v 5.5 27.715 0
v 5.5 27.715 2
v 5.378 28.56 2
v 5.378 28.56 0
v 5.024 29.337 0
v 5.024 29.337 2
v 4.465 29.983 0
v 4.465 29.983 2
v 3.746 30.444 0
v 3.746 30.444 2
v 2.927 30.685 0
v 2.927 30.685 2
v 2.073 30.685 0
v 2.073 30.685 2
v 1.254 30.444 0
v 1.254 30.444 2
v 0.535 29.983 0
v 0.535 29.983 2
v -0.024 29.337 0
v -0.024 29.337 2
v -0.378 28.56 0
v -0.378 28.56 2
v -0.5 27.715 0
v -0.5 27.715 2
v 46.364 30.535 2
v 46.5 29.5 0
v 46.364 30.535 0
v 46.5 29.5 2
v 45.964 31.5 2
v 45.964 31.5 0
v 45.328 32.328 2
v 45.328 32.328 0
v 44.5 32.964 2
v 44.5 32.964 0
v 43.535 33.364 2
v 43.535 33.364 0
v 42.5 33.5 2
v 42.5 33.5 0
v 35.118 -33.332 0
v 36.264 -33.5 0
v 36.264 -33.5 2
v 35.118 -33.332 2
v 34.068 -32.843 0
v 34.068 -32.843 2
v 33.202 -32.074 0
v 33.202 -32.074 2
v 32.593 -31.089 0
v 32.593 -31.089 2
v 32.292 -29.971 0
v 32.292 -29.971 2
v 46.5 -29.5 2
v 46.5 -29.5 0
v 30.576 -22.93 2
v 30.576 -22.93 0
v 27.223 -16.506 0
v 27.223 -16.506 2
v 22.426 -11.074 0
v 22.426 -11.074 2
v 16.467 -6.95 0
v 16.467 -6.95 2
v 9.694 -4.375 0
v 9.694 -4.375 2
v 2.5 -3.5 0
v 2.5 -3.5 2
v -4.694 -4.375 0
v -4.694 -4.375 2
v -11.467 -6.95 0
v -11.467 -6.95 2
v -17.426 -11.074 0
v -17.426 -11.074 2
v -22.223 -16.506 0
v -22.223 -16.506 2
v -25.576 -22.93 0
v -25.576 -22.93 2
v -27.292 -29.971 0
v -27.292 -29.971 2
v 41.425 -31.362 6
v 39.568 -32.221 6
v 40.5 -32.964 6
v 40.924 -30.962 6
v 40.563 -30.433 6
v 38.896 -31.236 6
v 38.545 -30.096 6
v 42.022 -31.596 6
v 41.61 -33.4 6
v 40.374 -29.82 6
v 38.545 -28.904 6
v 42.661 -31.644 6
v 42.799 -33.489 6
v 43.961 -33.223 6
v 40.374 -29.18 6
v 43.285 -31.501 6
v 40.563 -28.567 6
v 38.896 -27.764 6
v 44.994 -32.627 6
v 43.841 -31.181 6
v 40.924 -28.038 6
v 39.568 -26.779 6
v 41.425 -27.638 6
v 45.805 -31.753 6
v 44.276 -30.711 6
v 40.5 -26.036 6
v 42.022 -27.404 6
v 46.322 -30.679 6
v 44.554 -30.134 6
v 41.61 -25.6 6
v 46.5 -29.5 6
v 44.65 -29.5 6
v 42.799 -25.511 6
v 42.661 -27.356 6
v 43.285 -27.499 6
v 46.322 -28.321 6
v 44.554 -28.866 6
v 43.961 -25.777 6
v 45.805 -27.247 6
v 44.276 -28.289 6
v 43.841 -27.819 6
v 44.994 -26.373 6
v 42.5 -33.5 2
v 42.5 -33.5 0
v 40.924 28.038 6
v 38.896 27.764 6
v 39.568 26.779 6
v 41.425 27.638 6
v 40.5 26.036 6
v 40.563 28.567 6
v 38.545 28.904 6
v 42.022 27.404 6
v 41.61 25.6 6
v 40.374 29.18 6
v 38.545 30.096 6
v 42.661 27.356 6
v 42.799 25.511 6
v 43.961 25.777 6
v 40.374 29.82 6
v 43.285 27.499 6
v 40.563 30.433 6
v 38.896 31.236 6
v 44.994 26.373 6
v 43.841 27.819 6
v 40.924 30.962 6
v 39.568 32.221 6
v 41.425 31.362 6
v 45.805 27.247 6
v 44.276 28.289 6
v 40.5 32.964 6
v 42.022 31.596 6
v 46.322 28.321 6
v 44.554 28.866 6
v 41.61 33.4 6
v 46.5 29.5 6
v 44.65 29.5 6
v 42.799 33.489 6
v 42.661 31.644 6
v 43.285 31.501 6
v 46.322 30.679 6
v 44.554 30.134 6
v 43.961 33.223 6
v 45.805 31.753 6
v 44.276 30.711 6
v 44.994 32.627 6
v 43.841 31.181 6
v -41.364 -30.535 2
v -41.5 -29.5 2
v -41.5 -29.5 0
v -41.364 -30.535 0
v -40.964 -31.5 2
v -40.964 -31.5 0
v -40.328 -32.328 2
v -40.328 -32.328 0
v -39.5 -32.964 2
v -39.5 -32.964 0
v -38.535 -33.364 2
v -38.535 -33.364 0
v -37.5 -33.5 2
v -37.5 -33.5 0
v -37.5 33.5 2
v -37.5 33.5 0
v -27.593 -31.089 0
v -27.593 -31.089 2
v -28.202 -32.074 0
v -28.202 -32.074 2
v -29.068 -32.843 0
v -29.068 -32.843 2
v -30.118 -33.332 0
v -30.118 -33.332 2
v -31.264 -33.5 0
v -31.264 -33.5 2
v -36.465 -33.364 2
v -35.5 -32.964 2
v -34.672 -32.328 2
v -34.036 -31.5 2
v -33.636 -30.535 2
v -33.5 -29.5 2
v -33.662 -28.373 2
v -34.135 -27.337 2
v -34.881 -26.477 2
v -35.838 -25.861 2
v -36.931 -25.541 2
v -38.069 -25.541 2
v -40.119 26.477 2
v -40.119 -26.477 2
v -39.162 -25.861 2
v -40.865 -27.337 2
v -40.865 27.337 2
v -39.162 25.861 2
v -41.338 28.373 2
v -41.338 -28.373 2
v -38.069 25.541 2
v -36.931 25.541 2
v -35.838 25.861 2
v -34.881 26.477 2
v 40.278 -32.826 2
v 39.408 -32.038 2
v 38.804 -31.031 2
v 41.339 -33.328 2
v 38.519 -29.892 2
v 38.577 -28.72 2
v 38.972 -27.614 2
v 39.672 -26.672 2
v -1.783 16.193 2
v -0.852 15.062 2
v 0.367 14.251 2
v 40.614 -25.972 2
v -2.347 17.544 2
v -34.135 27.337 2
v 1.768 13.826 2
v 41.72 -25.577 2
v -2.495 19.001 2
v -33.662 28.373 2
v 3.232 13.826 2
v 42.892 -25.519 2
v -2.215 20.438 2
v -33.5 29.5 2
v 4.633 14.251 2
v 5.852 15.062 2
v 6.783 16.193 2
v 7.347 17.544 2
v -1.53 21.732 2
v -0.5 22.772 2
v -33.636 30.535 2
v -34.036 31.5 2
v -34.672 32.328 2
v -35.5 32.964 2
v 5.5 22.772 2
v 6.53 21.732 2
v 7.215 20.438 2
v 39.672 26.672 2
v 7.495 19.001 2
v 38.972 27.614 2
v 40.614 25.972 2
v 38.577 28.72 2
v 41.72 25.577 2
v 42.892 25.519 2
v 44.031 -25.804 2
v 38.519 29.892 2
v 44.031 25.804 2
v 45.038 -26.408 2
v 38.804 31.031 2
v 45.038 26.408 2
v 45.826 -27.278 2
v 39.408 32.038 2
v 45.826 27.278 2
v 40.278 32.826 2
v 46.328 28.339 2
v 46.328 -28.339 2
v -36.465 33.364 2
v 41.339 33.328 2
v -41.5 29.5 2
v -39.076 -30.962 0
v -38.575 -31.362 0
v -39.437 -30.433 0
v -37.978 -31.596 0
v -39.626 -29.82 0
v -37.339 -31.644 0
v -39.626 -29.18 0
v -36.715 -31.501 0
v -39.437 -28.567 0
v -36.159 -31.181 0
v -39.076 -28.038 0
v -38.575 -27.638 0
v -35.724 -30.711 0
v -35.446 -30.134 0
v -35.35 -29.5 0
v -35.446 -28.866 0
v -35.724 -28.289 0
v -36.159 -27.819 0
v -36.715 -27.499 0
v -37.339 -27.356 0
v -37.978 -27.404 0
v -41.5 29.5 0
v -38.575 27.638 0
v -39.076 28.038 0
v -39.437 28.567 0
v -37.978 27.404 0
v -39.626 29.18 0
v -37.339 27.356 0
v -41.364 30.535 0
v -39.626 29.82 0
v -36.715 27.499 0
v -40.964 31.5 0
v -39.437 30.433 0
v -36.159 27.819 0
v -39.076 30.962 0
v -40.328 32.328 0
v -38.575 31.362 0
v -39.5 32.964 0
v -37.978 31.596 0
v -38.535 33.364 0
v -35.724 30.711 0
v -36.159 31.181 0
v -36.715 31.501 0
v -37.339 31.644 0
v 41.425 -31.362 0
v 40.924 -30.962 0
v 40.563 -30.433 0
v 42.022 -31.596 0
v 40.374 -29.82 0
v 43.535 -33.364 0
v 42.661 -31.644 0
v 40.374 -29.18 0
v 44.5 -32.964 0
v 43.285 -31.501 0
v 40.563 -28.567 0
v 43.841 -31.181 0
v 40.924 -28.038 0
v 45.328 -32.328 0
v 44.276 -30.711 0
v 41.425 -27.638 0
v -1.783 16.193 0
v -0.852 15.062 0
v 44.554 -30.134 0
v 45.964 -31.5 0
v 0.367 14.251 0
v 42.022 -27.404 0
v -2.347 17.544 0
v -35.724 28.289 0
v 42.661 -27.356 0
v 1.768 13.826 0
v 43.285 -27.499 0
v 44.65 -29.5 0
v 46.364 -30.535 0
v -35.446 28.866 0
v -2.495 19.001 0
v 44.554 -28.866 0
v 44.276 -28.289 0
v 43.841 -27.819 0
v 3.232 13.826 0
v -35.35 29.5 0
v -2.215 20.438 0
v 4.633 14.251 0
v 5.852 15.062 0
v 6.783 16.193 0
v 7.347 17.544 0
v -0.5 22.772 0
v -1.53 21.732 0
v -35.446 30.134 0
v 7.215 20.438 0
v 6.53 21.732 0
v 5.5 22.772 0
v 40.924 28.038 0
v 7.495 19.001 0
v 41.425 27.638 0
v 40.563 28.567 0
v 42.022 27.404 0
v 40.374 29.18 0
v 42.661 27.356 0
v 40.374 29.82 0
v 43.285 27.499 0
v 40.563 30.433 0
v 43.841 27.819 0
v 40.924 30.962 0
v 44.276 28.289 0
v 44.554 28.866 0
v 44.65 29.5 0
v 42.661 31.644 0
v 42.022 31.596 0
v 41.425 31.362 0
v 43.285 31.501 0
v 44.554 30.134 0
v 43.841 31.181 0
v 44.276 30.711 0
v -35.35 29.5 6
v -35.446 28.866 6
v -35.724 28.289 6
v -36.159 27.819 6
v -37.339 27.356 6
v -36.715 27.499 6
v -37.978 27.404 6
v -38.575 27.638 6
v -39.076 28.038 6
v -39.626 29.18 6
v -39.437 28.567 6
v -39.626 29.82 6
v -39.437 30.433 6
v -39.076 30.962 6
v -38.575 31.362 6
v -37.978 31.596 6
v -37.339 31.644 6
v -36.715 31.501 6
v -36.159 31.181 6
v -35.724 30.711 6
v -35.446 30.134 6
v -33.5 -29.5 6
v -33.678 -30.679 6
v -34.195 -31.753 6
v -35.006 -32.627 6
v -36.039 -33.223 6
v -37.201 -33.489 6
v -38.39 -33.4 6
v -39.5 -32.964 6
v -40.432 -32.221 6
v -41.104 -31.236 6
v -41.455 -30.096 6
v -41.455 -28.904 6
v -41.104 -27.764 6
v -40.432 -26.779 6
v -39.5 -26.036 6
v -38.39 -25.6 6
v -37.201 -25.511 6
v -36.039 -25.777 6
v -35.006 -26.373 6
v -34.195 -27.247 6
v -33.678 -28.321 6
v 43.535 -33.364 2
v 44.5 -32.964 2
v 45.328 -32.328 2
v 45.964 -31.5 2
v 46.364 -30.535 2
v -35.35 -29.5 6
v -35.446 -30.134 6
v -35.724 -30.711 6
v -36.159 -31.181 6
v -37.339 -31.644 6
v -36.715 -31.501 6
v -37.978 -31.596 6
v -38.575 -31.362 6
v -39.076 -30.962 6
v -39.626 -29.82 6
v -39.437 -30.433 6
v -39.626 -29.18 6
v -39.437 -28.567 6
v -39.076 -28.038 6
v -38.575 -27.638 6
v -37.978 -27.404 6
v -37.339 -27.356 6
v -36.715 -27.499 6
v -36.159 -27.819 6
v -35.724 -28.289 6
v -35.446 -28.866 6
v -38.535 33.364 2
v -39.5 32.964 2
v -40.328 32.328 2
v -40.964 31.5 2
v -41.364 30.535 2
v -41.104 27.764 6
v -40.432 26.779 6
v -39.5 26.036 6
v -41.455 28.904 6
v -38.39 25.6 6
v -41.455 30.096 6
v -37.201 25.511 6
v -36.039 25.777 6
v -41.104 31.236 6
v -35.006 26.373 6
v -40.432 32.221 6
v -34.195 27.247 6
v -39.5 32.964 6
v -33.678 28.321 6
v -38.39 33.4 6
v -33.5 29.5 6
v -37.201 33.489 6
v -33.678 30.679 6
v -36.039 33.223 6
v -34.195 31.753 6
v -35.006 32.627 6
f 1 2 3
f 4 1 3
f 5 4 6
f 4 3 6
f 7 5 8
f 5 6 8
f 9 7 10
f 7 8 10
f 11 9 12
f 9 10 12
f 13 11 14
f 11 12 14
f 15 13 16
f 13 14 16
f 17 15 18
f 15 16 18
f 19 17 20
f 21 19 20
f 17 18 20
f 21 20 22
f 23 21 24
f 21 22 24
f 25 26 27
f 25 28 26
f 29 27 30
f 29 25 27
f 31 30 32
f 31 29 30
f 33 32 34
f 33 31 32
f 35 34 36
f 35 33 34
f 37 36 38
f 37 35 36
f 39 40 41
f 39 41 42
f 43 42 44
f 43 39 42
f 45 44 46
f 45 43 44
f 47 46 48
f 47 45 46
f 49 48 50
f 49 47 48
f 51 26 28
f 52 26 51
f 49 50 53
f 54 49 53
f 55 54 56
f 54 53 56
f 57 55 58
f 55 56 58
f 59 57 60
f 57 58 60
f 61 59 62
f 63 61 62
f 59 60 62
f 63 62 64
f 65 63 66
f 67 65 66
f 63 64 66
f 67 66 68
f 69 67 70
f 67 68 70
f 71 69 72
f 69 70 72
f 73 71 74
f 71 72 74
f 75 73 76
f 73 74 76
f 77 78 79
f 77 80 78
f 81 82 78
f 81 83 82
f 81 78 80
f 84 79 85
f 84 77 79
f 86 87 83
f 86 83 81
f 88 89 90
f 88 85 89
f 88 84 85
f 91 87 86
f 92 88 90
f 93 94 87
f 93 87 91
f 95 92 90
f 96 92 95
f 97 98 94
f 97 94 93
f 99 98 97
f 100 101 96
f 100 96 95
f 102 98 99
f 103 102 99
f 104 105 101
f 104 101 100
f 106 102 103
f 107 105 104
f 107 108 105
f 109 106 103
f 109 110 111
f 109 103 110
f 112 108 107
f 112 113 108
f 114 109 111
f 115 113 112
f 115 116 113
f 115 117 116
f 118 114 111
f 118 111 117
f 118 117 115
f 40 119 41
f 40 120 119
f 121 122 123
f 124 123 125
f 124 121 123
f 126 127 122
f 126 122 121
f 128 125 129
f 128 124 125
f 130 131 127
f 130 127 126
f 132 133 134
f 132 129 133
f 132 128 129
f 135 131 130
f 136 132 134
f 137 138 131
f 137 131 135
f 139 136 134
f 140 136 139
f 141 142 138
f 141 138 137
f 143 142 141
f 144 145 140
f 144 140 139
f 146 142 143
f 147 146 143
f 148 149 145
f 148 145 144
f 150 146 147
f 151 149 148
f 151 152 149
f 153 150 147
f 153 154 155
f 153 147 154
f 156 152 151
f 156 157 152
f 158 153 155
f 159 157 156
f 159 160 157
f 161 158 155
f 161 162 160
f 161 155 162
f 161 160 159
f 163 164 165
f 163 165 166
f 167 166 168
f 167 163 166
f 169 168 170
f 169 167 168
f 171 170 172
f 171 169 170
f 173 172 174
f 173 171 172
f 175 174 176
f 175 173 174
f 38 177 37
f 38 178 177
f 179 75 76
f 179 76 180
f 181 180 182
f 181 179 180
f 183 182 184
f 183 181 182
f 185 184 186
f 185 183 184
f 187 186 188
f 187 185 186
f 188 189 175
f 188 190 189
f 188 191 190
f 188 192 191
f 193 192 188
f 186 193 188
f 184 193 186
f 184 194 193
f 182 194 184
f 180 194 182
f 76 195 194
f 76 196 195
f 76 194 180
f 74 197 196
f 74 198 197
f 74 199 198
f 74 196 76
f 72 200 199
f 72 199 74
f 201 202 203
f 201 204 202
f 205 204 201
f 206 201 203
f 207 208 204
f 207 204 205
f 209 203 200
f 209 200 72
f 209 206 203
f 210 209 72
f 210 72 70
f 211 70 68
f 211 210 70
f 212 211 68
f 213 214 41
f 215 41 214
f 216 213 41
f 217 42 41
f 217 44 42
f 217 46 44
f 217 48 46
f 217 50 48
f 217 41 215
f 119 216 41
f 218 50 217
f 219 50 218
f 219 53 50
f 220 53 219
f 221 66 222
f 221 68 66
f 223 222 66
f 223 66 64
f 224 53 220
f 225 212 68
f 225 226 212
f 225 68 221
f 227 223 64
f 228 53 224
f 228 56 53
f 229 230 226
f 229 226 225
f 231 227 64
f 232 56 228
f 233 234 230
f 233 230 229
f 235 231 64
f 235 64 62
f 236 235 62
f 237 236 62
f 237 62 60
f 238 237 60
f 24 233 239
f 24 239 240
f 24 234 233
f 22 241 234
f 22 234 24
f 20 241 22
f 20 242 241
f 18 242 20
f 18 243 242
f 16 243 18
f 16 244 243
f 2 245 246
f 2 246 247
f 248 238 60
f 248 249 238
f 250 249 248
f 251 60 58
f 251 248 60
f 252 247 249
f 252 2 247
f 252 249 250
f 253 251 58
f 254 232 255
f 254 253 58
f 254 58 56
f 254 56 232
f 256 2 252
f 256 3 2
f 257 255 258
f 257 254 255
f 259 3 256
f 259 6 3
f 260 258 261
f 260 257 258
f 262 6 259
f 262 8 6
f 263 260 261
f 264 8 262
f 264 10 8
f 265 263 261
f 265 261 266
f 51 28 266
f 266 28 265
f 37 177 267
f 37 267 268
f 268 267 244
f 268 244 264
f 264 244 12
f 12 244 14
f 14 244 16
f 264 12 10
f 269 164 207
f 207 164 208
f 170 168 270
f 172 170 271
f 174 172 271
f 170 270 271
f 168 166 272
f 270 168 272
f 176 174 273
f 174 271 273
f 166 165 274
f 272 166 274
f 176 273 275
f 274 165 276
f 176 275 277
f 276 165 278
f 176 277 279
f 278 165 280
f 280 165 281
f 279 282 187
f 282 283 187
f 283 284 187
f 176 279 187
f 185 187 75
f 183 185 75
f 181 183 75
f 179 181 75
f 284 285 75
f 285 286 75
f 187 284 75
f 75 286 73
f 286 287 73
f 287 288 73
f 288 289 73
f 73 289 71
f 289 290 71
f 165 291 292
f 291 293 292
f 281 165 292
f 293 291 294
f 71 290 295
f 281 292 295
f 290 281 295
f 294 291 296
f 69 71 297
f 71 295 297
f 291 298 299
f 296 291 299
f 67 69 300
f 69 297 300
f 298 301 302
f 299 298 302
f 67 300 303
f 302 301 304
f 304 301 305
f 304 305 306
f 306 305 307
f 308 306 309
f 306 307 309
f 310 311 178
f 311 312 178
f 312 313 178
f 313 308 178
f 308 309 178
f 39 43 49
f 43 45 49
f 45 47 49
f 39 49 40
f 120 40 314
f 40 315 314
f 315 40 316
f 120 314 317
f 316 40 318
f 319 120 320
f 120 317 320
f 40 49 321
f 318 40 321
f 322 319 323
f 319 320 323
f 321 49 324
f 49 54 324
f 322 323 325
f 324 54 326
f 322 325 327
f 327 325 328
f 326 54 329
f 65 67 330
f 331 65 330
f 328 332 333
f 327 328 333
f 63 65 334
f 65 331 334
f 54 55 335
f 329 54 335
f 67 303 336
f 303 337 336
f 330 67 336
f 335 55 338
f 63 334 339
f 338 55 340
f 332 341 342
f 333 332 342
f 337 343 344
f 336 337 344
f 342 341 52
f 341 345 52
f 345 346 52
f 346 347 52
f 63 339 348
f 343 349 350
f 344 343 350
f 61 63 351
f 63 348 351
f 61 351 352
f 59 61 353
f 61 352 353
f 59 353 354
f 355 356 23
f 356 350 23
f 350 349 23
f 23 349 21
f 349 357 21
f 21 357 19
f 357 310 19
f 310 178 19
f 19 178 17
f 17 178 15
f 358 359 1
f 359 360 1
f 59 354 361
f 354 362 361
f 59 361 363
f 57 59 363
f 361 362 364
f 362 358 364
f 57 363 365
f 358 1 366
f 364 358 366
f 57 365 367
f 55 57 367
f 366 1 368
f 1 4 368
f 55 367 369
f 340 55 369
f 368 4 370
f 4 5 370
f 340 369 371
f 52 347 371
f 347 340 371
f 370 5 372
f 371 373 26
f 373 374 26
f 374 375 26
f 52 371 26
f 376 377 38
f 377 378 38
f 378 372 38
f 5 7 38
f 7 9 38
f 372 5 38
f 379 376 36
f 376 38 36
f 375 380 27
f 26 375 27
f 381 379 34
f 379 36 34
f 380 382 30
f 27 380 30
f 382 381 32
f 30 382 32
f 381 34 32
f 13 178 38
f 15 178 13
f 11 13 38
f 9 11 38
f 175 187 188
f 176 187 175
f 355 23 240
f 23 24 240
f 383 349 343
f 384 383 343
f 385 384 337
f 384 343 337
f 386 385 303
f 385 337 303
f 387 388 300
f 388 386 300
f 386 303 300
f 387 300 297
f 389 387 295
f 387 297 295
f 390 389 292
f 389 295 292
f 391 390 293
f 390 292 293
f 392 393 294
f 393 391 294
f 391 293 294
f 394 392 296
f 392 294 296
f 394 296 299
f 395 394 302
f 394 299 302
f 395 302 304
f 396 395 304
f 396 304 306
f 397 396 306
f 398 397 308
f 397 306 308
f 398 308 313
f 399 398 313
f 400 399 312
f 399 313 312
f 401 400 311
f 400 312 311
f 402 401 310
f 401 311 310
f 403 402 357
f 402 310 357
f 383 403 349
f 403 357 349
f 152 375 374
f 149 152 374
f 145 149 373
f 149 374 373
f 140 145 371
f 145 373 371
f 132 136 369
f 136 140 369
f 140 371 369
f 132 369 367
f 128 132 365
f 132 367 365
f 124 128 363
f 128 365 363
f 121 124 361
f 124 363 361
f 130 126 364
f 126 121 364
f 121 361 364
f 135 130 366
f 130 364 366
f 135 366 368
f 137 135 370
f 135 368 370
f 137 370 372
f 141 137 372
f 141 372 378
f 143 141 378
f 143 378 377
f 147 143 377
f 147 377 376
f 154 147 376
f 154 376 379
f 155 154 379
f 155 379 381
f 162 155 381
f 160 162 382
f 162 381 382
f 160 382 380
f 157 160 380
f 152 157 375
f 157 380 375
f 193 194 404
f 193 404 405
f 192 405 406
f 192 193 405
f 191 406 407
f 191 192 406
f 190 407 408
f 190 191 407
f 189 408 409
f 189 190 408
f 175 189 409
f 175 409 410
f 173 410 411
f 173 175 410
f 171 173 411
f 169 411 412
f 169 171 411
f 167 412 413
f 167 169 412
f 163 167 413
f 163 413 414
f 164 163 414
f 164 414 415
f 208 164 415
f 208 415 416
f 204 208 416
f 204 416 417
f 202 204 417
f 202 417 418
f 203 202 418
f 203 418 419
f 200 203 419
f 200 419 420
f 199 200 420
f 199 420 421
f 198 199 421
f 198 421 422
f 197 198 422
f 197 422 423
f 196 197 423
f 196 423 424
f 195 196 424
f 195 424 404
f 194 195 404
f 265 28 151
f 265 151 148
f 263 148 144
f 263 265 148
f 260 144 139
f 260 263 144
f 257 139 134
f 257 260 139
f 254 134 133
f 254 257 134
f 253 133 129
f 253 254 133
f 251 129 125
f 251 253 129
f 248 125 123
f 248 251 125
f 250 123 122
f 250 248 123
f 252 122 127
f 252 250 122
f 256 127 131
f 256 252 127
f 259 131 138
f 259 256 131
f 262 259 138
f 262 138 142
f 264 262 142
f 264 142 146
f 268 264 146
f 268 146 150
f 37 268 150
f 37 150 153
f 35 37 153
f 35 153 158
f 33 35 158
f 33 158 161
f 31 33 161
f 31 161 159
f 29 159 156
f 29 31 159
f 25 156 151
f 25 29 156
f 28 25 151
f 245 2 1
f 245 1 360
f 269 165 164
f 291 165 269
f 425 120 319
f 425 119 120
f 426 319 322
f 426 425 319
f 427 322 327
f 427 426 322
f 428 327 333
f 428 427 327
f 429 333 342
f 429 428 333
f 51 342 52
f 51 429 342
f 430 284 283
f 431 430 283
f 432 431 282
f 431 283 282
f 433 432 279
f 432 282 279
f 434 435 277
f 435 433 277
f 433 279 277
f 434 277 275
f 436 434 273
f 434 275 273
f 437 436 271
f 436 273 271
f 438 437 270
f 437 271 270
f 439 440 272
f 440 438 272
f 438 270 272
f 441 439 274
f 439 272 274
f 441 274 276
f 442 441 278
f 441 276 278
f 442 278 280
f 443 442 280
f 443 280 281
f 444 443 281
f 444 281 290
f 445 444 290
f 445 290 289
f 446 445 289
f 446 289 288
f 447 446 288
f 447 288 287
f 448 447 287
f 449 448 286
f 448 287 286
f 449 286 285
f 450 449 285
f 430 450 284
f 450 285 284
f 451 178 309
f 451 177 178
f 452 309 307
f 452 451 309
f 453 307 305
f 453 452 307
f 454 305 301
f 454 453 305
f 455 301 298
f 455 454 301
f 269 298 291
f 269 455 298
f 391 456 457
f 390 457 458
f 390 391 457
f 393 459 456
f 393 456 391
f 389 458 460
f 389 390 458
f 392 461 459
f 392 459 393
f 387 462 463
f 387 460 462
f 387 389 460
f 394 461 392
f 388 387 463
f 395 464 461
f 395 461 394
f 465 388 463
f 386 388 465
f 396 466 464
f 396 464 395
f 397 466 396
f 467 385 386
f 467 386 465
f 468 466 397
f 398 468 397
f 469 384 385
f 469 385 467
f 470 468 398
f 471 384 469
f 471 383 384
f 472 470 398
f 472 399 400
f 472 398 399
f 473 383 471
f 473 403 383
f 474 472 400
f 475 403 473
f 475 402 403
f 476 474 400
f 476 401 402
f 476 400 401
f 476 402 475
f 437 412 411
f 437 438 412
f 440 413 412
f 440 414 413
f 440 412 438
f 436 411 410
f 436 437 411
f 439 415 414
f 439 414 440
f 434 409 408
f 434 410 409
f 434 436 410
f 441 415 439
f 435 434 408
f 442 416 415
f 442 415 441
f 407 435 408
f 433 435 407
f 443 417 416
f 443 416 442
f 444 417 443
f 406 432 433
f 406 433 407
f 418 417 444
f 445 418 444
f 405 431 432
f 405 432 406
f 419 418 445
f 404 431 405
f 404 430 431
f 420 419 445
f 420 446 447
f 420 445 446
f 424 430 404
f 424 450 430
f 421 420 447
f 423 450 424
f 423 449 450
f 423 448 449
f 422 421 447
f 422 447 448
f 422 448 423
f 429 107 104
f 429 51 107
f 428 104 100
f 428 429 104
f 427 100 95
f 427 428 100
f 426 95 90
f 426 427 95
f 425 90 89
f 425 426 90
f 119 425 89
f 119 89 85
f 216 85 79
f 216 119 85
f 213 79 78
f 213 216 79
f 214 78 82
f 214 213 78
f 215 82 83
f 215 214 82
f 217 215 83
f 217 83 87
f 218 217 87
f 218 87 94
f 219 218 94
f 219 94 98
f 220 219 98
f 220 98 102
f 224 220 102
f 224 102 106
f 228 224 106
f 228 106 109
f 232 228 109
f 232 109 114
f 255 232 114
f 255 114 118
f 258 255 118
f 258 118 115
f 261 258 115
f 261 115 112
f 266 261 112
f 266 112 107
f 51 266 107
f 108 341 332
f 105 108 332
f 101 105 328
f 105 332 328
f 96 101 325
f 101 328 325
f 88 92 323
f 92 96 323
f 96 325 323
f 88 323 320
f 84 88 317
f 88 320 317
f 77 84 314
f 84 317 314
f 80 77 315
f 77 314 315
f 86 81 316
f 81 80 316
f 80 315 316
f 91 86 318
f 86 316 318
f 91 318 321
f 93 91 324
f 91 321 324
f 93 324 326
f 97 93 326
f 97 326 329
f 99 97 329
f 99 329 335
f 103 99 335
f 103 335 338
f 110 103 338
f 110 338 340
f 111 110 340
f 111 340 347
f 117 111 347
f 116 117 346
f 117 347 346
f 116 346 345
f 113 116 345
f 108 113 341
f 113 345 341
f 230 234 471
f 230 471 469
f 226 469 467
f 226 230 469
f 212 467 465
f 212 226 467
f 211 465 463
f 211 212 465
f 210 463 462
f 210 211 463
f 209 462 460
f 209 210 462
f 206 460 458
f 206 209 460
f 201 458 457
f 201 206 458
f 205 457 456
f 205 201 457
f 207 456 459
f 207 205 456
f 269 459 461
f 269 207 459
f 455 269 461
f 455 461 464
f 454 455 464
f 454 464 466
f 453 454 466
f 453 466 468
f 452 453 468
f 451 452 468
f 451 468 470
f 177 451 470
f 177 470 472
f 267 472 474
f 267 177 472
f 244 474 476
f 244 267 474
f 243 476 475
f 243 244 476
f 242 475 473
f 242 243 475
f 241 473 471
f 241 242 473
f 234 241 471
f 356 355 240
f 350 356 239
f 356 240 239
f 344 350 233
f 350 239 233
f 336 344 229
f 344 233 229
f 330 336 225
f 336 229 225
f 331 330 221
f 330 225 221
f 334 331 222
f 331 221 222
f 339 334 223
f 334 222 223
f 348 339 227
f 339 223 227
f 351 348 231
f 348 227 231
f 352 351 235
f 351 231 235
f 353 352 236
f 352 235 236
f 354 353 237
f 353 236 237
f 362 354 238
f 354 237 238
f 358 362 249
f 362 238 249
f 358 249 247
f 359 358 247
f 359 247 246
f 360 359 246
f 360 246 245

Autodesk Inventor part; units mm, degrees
ref_plane "YZ Plane" through (0, 0, 0) normal (1, 0, 0) x (0, 1, 0)
ref_plane "XZ Plane" through (0, 0, 0) normal (0, 1, 0) x (-1, 0, 0)
ref_plane "XY Plane" through (0, 0, 0) normal (0, 0, 1) x (1, 0, 0)
ref_plane "Work Plane1" through (0, 0, 0) normal (0, 0, 1) x (1, 0, 0)
ref_plane "Work Plane2" through (0, 0, 0) normal (0, 0, 1) x (1, 0, 0)
sketch "Sketch2" plane through (0, 0, 0) normal (0, 0, 1) x (1, 0, 0)
  circle A0 centre (42.5, -29.5) radius 2.15 projected
  circle A1 centre (-37.5, -29.5) radius 2.15 projected
  circle A2 centre (-37.5, 29.5) radius 2.15 projected
  circle A3 centre (42.5, 29.5) radius 2.15 projected
  line L0 (-41.5, 33.5) -> (46.5, 33.5)
  line L1 (46.5, 33.5) -> (46.5, -33.5)
  line L2 (46.5, -33.5) -> (-41.5, -33.5)
  line L3 (-41.5, -33.5) -> (-41.5, 33.5)
  line L4 (-37.5, 29.5) -> (42.5, 29.5)
  point P0 (0, 0)
  point P1 (-41.5, 0)
  point P2 (2.5, 29.5)
  point P3 (2.5, 33.5)
  dimension "d0" = 67
  dimension "d1" = 88
extrude "Extrusion1" add sketch "Sketch2" along normal blind 2
sketch "Sketch3" plane through (0, 0, 2) normal (0, 0, 1) x (1, 0, 0)
  circle A0 centre (2.5, 18.7725) radius 5
  line L0 (46.5, 33.5) -> (-41.5, 33.5) projected
  circle A1 centre (2.5, 27.7153) radius 3
  line L1 (-0.5, 27.7153) -> (-0.5, 22.7725)
  line L2 (5.5, 27.7153) -> (5.5, 22.7725)
  point P0 (0, 0)
  point P1 (2.5, 33.5)
  dimension "d4" = 10
  dimension "d5" = 6
extrude "Extrusion2" cut sketch "Sketch3" against normal through all
sketch "Sketch4" plane through (0, 0, 2) normal (0, 0, 1) x (1, 0, 0)
  circle A0 centre (-37.5, 29.5) radius 2.15 projected
  circle A1 centre (-37.5, 29.5) radius 4
  line L0 (46.5, 33.5) -> (-41.5, 33.5) projected
  circle A2 centre (-37.5, -29.5) radius 2.15 projected
  circle A3 centre (-37.5, -29.5) radius 4
  line L1 (-41.5, -33.5) -> (46.5, -33.5) projected
  circle A4 centre (42.5, -29.5) radius 2.15 projected
  circle A5 centre (42.5, -29.5) radius 4
  circle A6 centre (42.5, 29.5) radius 2.15 projected
  circle A7 centre (42.5, 29.5) radius 4
  point P0 (0, 0)
extrude "Extrusion3" add sketch "Sketch4" along normal blind 4
sketch "Sketch5" plane through (0, 0, 2) normal (0, 0, 1) x (1, 0, 0)
  line L0 (-41.5, -33.5) -> (46.5, -33.5) projected
  circle A0 centre (2.5, -33.5) radius 30
  point P0 (0, 0)
  point P1 (32.5, -33.5)
  point P2 (-27.5, -33.5)
  dimension "d10" = 60
extrude "Extrusion4" cut sketch "Sketch5" against normal through all contours A0 L0 picked at (9.9851, -22.0825)
fillet "Fillet1" radius 4 6 edges at (-41.5, 33.5, 1) (46.5, 33.5, 1) (-41.5, -33.5, 1) (46.5, -33.5, 1) (-27.5, -33.5, 1) (32.5, -33.5, 1)
properties part number "led 7 seg with sec v3 wall holder"
